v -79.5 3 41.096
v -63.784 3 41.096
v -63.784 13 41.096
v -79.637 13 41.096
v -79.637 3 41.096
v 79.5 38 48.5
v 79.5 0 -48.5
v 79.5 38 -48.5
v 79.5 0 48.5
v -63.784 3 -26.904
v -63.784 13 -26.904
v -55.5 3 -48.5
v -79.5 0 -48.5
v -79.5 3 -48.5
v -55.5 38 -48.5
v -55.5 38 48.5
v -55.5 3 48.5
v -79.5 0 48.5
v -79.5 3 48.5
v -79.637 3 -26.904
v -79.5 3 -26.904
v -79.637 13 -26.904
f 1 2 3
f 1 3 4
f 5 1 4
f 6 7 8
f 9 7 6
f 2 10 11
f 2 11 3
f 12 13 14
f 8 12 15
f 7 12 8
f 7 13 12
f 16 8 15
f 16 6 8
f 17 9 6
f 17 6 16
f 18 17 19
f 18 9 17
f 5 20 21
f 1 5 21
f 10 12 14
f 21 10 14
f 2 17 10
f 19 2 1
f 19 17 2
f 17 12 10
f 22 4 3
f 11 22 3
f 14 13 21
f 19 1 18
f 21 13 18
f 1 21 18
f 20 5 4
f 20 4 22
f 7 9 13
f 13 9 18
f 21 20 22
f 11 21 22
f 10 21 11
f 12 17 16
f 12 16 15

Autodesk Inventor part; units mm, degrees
ref_plane "YZ Plane" through (0, 0, 0) normal (1, 0, 0) x (0, 1, 0)
ref_plane "XZ Plane" through (0, 0, 0) normal (0, 1, 0) x (-1, 0, 0)
ref_plane "XY Plane" through (0, 0, 0) normal (0, 0, 1) x (1, 0, 0)
sketch "스케치2" plane through (0, 0, 0) normal (0, 1, 0) x (-1, 0, 0)
  line L0 (55.5, -48.5) -> (-79.5, -48.5)
  line L1 (-79.5, -48.5) -> (-79.5, 48.5)
  line L2 (-79.5, 48.5) -> (55.5, 48.5)
  line L3 (55.5, 48.5) -> (55.5, -48.5)
  point P0 (0, 0)
  dimension "d6" = 79.5
  dimension "d7" = 48.5
  dimension "d8" = 48.5
  dimension "d9" = 55.5
extrude "돌출2" add sketch "스케치2" along normal blind 38
sketch "스케치4" plane through (0, 0, 0) normal (0, 1, 0) x (-1, 0, 0)
  line L0 (-79.5, -48.5) -> (55.5, -48.5) projected
  line L1 (55.5, -48.5) -> (79.5, -48.5)
  line L2 (79.5, -48.5) -> (79.5, 48.5)
  line L3 (79.5, 48.5) -> (55.5, 48.5)
  line L4 (55.5, 48.5) -> (55.5, -48.5)
  point P0 (0, 0)
  dimension "d14" = 24
extrude "돌출4" add sketch "스케치4" along normal blind 3
sketch "스케치5" plane through (0, 3, 0) normal (0, 1, 0) x (1, 0, 0)
  line L0 (-79.6369, 26.9038) -> (-63.7841, 26.9038)
  line L1 (-63.7841, 26.9038) -> (-63.7841, -41.096)
  line L2 (-63.7841, -41.096) -> (-79.6369, -41.096)
  line L3 (-79.6369, -41.096) -> (-79.6369, 26.9038)
  point P0 (0, 0)
extrude "돌출5" add sketch "스케치5" along normal blind 10
properties part number "power supply"
